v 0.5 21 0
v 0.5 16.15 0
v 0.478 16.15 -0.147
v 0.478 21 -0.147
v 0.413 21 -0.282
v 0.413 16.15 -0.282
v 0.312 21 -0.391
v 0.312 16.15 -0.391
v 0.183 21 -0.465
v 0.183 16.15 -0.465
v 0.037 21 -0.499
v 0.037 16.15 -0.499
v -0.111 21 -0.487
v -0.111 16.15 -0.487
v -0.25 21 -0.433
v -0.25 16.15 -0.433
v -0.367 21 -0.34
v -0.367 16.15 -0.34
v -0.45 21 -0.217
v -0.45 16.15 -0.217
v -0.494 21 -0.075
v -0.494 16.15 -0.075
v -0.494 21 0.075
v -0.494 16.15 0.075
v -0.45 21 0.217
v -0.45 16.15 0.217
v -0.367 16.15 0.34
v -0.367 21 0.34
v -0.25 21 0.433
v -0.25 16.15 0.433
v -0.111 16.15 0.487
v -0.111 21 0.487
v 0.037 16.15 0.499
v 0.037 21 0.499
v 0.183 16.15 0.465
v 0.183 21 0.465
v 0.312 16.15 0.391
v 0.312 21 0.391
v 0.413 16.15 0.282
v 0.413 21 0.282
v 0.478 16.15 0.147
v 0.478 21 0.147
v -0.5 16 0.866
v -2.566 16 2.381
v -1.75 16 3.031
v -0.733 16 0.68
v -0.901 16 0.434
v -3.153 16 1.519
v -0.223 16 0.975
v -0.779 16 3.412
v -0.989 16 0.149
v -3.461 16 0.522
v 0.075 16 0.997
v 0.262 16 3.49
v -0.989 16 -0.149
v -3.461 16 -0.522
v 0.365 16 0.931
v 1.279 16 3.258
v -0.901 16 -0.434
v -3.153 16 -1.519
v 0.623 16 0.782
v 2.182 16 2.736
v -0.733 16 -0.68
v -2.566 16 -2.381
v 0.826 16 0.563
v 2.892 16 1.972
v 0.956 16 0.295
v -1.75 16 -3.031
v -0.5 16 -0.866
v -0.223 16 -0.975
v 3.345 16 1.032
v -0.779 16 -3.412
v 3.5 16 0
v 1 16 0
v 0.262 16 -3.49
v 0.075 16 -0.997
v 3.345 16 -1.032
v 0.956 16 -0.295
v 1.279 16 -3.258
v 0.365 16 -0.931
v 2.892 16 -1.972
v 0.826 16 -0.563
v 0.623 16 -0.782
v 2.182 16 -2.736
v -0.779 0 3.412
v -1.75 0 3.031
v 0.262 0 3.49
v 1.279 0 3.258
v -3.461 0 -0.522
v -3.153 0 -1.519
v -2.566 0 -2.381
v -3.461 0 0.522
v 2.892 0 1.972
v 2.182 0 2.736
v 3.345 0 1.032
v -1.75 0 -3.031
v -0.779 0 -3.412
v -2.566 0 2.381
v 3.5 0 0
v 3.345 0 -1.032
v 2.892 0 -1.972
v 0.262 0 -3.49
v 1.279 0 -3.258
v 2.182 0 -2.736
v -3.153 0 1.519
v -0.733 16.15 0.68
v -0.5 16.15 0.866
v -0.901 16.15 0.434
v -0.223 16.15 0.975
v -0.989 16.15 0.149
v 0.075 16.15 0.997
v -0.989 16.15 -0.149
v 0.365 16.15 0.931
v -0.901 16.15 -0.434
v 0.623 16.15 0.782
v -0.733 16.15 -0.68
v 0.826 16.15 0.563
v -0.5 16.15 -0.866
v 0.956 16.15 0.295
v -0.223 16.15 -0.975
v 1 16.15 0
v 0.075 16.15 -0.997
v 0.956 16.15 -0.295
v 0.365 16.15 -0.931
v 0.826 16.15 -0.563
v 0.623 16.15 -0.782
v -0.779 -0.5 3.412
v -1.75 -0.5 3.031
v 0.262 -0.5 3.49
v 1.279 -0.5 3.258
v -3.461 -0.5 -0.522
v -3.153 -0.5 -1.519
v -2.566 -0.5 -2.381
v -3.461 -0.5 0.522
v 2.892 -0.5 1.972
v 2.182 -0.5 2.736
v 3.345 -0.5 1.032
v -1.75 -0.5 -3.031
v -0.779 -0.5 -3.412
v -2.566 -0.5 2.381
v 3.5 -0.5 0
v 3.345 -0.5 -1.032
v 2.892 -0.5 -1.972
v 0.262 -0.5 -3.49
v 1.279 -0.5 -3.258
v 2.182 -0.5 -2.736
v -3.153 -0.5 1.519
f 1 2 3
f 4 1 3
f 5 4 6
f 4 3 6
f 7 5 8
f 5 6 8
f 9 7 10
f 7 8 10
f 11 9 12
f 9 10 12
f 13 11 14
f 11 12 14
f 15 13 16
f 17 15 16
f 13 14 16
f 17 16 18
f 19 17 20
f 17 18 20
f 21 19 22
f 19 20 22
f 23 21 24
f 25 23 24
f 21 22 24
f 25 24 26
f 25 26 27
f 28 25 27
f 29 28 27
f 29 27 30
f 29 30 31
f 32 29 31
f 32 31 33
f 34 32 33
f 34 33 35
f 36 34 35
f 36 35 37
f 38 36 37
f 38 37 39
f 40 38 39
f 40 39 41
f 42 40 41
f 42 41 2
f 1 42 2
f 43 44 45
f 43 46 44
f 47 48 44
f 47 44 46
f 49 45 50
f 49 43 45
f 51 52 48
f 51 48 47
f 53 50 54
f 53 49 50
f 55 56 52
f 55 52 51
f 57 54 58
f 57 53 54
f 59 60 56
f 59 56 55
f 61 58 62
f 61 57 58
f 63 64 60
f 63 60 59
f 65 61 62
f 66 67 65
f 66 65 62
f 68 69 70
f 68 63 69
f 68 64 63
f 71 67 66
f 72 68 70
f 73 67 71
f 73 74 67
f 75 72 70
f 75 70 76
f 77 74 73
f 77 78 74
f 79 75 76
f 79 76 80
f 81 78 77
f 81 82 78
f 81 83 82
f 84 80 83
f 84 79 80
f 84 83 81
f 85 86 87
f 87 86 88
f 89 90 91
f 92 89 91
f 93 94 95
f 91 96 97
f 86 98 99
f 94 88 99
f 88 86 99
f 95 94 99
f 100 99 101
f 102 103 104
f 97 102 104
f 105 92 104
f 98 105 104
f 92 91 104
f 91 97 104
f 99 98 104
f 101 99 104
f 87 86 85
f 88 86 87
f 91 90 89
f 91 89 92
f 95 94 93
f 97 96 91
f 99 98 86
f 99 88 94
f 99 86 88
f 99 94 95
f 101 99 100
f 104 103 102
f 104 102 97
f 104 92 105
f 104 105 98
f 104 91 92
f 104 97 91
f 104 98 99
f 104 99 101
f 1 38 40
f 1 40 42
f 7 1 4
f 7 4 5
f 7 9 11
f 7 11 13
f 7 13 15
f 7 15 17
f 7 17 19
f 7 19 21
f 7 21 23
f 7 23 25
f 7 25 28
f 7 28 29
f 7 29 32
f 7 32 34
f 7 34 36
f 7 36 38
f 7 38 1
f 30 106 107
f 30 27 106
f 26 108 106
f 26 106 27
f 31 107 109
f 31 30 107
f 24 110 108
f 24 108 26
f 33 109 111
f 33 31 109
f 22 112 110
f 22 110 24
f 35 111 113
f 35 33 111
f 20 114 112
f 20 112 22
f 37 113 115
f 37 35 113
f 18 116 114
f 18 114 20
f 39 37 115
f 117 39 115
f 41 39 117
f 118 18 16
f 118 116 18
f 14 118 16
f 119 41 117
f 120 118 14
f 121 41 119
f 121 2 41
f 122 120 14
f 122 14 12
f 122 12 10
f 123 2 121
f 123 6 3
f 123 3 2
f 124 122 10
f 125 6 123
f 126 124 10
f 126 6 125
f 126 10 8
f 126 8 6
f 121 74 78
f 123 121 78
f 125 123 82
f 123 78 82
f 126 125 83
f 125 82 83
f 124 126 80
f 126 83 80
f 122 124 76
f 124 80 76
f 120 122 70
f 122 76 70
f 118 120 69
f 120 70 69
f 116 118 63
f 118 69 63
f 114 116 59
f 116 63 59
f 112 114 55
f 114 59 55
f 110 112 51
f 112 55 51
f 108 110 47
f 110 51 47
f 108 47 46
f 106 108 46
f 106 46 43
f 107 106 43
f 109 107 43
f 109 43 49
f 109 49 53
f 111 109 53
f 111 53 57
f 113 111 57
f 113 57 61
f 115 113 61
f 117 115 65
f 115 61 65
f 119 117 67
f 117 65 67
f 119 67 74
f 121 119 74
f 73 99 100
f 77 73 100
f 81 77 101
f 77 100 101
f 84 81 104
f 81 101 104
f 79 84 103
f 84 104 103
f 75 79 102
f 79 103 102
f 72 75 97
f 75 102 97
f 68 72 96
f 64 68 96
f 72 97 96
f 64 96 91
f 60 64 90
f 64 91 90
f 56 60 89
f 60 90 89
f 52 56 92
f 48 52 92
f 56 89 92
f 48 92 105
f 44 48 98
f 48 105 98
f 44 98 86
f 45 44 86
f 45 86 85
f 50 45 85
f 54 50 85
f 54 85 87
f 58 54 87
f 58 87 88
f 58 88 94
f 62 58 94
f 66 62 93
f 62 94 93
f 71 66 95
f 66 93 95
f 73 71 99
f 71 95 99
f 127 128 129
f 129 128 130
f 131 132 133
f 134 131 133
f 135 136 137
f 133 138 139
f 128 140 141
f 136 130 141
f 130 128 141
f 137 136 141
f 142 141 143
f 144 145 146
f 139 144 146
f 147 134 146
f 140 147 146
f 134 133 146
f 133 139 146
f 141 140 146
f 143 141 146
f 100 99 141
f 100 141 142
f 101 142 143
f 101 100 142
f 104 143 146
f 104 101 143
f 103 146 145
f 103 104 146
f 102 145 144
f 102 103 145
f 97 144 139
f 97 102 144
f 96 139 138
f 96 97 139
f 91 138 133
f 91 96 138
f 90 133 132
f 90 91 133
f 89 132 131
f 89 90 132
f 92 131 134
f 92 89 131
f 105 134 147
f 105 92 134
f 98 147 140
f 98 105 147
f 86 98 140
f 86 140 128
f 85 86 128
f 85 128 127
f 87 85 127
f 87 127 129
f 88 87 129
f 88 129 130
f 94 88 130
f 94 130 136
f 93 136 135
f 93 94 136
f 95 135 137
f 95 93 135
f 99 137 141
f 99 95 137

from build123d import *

# Parameters (mm, degrees)
SKETCH1_R           = 3.5
BOSS_EXTRUDE1_DEPTH = 16
SKETCH2_R           = 0.5
BOSS_EXTRUDE2_DEPTH = 5
SKETCH3_R           = 1
BOSS_EXTRUDE3_DEPTH = 0.15
SKETCH1_2_R         = 3.5
BOSS_EXTRUDE4_DEPTH = 0.5


with BuildPart() as part:
    # Sketch1 → Boss-Extrude1 (new body)
    with BuildSketch(Plane(origin=(0, 0, 0), x_dir=(1, 0, 0), z_dir=(0, 1, 0))):
        Circle(SKETCH1_R)
    extrude(amount=BOSS_EXTRUDE1_DEPTH)

    # Sketch2 → Boss-Extrude2 (add)
    with BuildSketch(Plane(origin=(0, 16, 0), x_dir=(1, 0, 0), z_dir=(0, 1, 0))):
        Circle(SKETCH2_R)
    extrude(amount=BOSS_EXTRUDE2_DEPTH)

    # Sketch3 → Boss-Extrude3 (add)
    with BuildSketch(Plane(origin=(0, 16, 0), x_dir=(1, 0, 0), z_dir=(0, 1, 0))):
        Circle(SKETCH3_R)
    extrude(amount=BOSS_EXTRUDE3_DEPTH)


with BuildPart() as body_2:
    # Sketch1<2> → Boss-Extrude4 (new body)
    with BuildSketch(Plane(origin=(0, 0, 0), x_dir=(1, 0, 0), z_dir=(0, 1, 0))):
        Circle(SKETCH1_2_R)
    extrude(amount=-BOSS_EXTRUDE4_DEPTH)


solid = Compound([part.part, body_2.part])
